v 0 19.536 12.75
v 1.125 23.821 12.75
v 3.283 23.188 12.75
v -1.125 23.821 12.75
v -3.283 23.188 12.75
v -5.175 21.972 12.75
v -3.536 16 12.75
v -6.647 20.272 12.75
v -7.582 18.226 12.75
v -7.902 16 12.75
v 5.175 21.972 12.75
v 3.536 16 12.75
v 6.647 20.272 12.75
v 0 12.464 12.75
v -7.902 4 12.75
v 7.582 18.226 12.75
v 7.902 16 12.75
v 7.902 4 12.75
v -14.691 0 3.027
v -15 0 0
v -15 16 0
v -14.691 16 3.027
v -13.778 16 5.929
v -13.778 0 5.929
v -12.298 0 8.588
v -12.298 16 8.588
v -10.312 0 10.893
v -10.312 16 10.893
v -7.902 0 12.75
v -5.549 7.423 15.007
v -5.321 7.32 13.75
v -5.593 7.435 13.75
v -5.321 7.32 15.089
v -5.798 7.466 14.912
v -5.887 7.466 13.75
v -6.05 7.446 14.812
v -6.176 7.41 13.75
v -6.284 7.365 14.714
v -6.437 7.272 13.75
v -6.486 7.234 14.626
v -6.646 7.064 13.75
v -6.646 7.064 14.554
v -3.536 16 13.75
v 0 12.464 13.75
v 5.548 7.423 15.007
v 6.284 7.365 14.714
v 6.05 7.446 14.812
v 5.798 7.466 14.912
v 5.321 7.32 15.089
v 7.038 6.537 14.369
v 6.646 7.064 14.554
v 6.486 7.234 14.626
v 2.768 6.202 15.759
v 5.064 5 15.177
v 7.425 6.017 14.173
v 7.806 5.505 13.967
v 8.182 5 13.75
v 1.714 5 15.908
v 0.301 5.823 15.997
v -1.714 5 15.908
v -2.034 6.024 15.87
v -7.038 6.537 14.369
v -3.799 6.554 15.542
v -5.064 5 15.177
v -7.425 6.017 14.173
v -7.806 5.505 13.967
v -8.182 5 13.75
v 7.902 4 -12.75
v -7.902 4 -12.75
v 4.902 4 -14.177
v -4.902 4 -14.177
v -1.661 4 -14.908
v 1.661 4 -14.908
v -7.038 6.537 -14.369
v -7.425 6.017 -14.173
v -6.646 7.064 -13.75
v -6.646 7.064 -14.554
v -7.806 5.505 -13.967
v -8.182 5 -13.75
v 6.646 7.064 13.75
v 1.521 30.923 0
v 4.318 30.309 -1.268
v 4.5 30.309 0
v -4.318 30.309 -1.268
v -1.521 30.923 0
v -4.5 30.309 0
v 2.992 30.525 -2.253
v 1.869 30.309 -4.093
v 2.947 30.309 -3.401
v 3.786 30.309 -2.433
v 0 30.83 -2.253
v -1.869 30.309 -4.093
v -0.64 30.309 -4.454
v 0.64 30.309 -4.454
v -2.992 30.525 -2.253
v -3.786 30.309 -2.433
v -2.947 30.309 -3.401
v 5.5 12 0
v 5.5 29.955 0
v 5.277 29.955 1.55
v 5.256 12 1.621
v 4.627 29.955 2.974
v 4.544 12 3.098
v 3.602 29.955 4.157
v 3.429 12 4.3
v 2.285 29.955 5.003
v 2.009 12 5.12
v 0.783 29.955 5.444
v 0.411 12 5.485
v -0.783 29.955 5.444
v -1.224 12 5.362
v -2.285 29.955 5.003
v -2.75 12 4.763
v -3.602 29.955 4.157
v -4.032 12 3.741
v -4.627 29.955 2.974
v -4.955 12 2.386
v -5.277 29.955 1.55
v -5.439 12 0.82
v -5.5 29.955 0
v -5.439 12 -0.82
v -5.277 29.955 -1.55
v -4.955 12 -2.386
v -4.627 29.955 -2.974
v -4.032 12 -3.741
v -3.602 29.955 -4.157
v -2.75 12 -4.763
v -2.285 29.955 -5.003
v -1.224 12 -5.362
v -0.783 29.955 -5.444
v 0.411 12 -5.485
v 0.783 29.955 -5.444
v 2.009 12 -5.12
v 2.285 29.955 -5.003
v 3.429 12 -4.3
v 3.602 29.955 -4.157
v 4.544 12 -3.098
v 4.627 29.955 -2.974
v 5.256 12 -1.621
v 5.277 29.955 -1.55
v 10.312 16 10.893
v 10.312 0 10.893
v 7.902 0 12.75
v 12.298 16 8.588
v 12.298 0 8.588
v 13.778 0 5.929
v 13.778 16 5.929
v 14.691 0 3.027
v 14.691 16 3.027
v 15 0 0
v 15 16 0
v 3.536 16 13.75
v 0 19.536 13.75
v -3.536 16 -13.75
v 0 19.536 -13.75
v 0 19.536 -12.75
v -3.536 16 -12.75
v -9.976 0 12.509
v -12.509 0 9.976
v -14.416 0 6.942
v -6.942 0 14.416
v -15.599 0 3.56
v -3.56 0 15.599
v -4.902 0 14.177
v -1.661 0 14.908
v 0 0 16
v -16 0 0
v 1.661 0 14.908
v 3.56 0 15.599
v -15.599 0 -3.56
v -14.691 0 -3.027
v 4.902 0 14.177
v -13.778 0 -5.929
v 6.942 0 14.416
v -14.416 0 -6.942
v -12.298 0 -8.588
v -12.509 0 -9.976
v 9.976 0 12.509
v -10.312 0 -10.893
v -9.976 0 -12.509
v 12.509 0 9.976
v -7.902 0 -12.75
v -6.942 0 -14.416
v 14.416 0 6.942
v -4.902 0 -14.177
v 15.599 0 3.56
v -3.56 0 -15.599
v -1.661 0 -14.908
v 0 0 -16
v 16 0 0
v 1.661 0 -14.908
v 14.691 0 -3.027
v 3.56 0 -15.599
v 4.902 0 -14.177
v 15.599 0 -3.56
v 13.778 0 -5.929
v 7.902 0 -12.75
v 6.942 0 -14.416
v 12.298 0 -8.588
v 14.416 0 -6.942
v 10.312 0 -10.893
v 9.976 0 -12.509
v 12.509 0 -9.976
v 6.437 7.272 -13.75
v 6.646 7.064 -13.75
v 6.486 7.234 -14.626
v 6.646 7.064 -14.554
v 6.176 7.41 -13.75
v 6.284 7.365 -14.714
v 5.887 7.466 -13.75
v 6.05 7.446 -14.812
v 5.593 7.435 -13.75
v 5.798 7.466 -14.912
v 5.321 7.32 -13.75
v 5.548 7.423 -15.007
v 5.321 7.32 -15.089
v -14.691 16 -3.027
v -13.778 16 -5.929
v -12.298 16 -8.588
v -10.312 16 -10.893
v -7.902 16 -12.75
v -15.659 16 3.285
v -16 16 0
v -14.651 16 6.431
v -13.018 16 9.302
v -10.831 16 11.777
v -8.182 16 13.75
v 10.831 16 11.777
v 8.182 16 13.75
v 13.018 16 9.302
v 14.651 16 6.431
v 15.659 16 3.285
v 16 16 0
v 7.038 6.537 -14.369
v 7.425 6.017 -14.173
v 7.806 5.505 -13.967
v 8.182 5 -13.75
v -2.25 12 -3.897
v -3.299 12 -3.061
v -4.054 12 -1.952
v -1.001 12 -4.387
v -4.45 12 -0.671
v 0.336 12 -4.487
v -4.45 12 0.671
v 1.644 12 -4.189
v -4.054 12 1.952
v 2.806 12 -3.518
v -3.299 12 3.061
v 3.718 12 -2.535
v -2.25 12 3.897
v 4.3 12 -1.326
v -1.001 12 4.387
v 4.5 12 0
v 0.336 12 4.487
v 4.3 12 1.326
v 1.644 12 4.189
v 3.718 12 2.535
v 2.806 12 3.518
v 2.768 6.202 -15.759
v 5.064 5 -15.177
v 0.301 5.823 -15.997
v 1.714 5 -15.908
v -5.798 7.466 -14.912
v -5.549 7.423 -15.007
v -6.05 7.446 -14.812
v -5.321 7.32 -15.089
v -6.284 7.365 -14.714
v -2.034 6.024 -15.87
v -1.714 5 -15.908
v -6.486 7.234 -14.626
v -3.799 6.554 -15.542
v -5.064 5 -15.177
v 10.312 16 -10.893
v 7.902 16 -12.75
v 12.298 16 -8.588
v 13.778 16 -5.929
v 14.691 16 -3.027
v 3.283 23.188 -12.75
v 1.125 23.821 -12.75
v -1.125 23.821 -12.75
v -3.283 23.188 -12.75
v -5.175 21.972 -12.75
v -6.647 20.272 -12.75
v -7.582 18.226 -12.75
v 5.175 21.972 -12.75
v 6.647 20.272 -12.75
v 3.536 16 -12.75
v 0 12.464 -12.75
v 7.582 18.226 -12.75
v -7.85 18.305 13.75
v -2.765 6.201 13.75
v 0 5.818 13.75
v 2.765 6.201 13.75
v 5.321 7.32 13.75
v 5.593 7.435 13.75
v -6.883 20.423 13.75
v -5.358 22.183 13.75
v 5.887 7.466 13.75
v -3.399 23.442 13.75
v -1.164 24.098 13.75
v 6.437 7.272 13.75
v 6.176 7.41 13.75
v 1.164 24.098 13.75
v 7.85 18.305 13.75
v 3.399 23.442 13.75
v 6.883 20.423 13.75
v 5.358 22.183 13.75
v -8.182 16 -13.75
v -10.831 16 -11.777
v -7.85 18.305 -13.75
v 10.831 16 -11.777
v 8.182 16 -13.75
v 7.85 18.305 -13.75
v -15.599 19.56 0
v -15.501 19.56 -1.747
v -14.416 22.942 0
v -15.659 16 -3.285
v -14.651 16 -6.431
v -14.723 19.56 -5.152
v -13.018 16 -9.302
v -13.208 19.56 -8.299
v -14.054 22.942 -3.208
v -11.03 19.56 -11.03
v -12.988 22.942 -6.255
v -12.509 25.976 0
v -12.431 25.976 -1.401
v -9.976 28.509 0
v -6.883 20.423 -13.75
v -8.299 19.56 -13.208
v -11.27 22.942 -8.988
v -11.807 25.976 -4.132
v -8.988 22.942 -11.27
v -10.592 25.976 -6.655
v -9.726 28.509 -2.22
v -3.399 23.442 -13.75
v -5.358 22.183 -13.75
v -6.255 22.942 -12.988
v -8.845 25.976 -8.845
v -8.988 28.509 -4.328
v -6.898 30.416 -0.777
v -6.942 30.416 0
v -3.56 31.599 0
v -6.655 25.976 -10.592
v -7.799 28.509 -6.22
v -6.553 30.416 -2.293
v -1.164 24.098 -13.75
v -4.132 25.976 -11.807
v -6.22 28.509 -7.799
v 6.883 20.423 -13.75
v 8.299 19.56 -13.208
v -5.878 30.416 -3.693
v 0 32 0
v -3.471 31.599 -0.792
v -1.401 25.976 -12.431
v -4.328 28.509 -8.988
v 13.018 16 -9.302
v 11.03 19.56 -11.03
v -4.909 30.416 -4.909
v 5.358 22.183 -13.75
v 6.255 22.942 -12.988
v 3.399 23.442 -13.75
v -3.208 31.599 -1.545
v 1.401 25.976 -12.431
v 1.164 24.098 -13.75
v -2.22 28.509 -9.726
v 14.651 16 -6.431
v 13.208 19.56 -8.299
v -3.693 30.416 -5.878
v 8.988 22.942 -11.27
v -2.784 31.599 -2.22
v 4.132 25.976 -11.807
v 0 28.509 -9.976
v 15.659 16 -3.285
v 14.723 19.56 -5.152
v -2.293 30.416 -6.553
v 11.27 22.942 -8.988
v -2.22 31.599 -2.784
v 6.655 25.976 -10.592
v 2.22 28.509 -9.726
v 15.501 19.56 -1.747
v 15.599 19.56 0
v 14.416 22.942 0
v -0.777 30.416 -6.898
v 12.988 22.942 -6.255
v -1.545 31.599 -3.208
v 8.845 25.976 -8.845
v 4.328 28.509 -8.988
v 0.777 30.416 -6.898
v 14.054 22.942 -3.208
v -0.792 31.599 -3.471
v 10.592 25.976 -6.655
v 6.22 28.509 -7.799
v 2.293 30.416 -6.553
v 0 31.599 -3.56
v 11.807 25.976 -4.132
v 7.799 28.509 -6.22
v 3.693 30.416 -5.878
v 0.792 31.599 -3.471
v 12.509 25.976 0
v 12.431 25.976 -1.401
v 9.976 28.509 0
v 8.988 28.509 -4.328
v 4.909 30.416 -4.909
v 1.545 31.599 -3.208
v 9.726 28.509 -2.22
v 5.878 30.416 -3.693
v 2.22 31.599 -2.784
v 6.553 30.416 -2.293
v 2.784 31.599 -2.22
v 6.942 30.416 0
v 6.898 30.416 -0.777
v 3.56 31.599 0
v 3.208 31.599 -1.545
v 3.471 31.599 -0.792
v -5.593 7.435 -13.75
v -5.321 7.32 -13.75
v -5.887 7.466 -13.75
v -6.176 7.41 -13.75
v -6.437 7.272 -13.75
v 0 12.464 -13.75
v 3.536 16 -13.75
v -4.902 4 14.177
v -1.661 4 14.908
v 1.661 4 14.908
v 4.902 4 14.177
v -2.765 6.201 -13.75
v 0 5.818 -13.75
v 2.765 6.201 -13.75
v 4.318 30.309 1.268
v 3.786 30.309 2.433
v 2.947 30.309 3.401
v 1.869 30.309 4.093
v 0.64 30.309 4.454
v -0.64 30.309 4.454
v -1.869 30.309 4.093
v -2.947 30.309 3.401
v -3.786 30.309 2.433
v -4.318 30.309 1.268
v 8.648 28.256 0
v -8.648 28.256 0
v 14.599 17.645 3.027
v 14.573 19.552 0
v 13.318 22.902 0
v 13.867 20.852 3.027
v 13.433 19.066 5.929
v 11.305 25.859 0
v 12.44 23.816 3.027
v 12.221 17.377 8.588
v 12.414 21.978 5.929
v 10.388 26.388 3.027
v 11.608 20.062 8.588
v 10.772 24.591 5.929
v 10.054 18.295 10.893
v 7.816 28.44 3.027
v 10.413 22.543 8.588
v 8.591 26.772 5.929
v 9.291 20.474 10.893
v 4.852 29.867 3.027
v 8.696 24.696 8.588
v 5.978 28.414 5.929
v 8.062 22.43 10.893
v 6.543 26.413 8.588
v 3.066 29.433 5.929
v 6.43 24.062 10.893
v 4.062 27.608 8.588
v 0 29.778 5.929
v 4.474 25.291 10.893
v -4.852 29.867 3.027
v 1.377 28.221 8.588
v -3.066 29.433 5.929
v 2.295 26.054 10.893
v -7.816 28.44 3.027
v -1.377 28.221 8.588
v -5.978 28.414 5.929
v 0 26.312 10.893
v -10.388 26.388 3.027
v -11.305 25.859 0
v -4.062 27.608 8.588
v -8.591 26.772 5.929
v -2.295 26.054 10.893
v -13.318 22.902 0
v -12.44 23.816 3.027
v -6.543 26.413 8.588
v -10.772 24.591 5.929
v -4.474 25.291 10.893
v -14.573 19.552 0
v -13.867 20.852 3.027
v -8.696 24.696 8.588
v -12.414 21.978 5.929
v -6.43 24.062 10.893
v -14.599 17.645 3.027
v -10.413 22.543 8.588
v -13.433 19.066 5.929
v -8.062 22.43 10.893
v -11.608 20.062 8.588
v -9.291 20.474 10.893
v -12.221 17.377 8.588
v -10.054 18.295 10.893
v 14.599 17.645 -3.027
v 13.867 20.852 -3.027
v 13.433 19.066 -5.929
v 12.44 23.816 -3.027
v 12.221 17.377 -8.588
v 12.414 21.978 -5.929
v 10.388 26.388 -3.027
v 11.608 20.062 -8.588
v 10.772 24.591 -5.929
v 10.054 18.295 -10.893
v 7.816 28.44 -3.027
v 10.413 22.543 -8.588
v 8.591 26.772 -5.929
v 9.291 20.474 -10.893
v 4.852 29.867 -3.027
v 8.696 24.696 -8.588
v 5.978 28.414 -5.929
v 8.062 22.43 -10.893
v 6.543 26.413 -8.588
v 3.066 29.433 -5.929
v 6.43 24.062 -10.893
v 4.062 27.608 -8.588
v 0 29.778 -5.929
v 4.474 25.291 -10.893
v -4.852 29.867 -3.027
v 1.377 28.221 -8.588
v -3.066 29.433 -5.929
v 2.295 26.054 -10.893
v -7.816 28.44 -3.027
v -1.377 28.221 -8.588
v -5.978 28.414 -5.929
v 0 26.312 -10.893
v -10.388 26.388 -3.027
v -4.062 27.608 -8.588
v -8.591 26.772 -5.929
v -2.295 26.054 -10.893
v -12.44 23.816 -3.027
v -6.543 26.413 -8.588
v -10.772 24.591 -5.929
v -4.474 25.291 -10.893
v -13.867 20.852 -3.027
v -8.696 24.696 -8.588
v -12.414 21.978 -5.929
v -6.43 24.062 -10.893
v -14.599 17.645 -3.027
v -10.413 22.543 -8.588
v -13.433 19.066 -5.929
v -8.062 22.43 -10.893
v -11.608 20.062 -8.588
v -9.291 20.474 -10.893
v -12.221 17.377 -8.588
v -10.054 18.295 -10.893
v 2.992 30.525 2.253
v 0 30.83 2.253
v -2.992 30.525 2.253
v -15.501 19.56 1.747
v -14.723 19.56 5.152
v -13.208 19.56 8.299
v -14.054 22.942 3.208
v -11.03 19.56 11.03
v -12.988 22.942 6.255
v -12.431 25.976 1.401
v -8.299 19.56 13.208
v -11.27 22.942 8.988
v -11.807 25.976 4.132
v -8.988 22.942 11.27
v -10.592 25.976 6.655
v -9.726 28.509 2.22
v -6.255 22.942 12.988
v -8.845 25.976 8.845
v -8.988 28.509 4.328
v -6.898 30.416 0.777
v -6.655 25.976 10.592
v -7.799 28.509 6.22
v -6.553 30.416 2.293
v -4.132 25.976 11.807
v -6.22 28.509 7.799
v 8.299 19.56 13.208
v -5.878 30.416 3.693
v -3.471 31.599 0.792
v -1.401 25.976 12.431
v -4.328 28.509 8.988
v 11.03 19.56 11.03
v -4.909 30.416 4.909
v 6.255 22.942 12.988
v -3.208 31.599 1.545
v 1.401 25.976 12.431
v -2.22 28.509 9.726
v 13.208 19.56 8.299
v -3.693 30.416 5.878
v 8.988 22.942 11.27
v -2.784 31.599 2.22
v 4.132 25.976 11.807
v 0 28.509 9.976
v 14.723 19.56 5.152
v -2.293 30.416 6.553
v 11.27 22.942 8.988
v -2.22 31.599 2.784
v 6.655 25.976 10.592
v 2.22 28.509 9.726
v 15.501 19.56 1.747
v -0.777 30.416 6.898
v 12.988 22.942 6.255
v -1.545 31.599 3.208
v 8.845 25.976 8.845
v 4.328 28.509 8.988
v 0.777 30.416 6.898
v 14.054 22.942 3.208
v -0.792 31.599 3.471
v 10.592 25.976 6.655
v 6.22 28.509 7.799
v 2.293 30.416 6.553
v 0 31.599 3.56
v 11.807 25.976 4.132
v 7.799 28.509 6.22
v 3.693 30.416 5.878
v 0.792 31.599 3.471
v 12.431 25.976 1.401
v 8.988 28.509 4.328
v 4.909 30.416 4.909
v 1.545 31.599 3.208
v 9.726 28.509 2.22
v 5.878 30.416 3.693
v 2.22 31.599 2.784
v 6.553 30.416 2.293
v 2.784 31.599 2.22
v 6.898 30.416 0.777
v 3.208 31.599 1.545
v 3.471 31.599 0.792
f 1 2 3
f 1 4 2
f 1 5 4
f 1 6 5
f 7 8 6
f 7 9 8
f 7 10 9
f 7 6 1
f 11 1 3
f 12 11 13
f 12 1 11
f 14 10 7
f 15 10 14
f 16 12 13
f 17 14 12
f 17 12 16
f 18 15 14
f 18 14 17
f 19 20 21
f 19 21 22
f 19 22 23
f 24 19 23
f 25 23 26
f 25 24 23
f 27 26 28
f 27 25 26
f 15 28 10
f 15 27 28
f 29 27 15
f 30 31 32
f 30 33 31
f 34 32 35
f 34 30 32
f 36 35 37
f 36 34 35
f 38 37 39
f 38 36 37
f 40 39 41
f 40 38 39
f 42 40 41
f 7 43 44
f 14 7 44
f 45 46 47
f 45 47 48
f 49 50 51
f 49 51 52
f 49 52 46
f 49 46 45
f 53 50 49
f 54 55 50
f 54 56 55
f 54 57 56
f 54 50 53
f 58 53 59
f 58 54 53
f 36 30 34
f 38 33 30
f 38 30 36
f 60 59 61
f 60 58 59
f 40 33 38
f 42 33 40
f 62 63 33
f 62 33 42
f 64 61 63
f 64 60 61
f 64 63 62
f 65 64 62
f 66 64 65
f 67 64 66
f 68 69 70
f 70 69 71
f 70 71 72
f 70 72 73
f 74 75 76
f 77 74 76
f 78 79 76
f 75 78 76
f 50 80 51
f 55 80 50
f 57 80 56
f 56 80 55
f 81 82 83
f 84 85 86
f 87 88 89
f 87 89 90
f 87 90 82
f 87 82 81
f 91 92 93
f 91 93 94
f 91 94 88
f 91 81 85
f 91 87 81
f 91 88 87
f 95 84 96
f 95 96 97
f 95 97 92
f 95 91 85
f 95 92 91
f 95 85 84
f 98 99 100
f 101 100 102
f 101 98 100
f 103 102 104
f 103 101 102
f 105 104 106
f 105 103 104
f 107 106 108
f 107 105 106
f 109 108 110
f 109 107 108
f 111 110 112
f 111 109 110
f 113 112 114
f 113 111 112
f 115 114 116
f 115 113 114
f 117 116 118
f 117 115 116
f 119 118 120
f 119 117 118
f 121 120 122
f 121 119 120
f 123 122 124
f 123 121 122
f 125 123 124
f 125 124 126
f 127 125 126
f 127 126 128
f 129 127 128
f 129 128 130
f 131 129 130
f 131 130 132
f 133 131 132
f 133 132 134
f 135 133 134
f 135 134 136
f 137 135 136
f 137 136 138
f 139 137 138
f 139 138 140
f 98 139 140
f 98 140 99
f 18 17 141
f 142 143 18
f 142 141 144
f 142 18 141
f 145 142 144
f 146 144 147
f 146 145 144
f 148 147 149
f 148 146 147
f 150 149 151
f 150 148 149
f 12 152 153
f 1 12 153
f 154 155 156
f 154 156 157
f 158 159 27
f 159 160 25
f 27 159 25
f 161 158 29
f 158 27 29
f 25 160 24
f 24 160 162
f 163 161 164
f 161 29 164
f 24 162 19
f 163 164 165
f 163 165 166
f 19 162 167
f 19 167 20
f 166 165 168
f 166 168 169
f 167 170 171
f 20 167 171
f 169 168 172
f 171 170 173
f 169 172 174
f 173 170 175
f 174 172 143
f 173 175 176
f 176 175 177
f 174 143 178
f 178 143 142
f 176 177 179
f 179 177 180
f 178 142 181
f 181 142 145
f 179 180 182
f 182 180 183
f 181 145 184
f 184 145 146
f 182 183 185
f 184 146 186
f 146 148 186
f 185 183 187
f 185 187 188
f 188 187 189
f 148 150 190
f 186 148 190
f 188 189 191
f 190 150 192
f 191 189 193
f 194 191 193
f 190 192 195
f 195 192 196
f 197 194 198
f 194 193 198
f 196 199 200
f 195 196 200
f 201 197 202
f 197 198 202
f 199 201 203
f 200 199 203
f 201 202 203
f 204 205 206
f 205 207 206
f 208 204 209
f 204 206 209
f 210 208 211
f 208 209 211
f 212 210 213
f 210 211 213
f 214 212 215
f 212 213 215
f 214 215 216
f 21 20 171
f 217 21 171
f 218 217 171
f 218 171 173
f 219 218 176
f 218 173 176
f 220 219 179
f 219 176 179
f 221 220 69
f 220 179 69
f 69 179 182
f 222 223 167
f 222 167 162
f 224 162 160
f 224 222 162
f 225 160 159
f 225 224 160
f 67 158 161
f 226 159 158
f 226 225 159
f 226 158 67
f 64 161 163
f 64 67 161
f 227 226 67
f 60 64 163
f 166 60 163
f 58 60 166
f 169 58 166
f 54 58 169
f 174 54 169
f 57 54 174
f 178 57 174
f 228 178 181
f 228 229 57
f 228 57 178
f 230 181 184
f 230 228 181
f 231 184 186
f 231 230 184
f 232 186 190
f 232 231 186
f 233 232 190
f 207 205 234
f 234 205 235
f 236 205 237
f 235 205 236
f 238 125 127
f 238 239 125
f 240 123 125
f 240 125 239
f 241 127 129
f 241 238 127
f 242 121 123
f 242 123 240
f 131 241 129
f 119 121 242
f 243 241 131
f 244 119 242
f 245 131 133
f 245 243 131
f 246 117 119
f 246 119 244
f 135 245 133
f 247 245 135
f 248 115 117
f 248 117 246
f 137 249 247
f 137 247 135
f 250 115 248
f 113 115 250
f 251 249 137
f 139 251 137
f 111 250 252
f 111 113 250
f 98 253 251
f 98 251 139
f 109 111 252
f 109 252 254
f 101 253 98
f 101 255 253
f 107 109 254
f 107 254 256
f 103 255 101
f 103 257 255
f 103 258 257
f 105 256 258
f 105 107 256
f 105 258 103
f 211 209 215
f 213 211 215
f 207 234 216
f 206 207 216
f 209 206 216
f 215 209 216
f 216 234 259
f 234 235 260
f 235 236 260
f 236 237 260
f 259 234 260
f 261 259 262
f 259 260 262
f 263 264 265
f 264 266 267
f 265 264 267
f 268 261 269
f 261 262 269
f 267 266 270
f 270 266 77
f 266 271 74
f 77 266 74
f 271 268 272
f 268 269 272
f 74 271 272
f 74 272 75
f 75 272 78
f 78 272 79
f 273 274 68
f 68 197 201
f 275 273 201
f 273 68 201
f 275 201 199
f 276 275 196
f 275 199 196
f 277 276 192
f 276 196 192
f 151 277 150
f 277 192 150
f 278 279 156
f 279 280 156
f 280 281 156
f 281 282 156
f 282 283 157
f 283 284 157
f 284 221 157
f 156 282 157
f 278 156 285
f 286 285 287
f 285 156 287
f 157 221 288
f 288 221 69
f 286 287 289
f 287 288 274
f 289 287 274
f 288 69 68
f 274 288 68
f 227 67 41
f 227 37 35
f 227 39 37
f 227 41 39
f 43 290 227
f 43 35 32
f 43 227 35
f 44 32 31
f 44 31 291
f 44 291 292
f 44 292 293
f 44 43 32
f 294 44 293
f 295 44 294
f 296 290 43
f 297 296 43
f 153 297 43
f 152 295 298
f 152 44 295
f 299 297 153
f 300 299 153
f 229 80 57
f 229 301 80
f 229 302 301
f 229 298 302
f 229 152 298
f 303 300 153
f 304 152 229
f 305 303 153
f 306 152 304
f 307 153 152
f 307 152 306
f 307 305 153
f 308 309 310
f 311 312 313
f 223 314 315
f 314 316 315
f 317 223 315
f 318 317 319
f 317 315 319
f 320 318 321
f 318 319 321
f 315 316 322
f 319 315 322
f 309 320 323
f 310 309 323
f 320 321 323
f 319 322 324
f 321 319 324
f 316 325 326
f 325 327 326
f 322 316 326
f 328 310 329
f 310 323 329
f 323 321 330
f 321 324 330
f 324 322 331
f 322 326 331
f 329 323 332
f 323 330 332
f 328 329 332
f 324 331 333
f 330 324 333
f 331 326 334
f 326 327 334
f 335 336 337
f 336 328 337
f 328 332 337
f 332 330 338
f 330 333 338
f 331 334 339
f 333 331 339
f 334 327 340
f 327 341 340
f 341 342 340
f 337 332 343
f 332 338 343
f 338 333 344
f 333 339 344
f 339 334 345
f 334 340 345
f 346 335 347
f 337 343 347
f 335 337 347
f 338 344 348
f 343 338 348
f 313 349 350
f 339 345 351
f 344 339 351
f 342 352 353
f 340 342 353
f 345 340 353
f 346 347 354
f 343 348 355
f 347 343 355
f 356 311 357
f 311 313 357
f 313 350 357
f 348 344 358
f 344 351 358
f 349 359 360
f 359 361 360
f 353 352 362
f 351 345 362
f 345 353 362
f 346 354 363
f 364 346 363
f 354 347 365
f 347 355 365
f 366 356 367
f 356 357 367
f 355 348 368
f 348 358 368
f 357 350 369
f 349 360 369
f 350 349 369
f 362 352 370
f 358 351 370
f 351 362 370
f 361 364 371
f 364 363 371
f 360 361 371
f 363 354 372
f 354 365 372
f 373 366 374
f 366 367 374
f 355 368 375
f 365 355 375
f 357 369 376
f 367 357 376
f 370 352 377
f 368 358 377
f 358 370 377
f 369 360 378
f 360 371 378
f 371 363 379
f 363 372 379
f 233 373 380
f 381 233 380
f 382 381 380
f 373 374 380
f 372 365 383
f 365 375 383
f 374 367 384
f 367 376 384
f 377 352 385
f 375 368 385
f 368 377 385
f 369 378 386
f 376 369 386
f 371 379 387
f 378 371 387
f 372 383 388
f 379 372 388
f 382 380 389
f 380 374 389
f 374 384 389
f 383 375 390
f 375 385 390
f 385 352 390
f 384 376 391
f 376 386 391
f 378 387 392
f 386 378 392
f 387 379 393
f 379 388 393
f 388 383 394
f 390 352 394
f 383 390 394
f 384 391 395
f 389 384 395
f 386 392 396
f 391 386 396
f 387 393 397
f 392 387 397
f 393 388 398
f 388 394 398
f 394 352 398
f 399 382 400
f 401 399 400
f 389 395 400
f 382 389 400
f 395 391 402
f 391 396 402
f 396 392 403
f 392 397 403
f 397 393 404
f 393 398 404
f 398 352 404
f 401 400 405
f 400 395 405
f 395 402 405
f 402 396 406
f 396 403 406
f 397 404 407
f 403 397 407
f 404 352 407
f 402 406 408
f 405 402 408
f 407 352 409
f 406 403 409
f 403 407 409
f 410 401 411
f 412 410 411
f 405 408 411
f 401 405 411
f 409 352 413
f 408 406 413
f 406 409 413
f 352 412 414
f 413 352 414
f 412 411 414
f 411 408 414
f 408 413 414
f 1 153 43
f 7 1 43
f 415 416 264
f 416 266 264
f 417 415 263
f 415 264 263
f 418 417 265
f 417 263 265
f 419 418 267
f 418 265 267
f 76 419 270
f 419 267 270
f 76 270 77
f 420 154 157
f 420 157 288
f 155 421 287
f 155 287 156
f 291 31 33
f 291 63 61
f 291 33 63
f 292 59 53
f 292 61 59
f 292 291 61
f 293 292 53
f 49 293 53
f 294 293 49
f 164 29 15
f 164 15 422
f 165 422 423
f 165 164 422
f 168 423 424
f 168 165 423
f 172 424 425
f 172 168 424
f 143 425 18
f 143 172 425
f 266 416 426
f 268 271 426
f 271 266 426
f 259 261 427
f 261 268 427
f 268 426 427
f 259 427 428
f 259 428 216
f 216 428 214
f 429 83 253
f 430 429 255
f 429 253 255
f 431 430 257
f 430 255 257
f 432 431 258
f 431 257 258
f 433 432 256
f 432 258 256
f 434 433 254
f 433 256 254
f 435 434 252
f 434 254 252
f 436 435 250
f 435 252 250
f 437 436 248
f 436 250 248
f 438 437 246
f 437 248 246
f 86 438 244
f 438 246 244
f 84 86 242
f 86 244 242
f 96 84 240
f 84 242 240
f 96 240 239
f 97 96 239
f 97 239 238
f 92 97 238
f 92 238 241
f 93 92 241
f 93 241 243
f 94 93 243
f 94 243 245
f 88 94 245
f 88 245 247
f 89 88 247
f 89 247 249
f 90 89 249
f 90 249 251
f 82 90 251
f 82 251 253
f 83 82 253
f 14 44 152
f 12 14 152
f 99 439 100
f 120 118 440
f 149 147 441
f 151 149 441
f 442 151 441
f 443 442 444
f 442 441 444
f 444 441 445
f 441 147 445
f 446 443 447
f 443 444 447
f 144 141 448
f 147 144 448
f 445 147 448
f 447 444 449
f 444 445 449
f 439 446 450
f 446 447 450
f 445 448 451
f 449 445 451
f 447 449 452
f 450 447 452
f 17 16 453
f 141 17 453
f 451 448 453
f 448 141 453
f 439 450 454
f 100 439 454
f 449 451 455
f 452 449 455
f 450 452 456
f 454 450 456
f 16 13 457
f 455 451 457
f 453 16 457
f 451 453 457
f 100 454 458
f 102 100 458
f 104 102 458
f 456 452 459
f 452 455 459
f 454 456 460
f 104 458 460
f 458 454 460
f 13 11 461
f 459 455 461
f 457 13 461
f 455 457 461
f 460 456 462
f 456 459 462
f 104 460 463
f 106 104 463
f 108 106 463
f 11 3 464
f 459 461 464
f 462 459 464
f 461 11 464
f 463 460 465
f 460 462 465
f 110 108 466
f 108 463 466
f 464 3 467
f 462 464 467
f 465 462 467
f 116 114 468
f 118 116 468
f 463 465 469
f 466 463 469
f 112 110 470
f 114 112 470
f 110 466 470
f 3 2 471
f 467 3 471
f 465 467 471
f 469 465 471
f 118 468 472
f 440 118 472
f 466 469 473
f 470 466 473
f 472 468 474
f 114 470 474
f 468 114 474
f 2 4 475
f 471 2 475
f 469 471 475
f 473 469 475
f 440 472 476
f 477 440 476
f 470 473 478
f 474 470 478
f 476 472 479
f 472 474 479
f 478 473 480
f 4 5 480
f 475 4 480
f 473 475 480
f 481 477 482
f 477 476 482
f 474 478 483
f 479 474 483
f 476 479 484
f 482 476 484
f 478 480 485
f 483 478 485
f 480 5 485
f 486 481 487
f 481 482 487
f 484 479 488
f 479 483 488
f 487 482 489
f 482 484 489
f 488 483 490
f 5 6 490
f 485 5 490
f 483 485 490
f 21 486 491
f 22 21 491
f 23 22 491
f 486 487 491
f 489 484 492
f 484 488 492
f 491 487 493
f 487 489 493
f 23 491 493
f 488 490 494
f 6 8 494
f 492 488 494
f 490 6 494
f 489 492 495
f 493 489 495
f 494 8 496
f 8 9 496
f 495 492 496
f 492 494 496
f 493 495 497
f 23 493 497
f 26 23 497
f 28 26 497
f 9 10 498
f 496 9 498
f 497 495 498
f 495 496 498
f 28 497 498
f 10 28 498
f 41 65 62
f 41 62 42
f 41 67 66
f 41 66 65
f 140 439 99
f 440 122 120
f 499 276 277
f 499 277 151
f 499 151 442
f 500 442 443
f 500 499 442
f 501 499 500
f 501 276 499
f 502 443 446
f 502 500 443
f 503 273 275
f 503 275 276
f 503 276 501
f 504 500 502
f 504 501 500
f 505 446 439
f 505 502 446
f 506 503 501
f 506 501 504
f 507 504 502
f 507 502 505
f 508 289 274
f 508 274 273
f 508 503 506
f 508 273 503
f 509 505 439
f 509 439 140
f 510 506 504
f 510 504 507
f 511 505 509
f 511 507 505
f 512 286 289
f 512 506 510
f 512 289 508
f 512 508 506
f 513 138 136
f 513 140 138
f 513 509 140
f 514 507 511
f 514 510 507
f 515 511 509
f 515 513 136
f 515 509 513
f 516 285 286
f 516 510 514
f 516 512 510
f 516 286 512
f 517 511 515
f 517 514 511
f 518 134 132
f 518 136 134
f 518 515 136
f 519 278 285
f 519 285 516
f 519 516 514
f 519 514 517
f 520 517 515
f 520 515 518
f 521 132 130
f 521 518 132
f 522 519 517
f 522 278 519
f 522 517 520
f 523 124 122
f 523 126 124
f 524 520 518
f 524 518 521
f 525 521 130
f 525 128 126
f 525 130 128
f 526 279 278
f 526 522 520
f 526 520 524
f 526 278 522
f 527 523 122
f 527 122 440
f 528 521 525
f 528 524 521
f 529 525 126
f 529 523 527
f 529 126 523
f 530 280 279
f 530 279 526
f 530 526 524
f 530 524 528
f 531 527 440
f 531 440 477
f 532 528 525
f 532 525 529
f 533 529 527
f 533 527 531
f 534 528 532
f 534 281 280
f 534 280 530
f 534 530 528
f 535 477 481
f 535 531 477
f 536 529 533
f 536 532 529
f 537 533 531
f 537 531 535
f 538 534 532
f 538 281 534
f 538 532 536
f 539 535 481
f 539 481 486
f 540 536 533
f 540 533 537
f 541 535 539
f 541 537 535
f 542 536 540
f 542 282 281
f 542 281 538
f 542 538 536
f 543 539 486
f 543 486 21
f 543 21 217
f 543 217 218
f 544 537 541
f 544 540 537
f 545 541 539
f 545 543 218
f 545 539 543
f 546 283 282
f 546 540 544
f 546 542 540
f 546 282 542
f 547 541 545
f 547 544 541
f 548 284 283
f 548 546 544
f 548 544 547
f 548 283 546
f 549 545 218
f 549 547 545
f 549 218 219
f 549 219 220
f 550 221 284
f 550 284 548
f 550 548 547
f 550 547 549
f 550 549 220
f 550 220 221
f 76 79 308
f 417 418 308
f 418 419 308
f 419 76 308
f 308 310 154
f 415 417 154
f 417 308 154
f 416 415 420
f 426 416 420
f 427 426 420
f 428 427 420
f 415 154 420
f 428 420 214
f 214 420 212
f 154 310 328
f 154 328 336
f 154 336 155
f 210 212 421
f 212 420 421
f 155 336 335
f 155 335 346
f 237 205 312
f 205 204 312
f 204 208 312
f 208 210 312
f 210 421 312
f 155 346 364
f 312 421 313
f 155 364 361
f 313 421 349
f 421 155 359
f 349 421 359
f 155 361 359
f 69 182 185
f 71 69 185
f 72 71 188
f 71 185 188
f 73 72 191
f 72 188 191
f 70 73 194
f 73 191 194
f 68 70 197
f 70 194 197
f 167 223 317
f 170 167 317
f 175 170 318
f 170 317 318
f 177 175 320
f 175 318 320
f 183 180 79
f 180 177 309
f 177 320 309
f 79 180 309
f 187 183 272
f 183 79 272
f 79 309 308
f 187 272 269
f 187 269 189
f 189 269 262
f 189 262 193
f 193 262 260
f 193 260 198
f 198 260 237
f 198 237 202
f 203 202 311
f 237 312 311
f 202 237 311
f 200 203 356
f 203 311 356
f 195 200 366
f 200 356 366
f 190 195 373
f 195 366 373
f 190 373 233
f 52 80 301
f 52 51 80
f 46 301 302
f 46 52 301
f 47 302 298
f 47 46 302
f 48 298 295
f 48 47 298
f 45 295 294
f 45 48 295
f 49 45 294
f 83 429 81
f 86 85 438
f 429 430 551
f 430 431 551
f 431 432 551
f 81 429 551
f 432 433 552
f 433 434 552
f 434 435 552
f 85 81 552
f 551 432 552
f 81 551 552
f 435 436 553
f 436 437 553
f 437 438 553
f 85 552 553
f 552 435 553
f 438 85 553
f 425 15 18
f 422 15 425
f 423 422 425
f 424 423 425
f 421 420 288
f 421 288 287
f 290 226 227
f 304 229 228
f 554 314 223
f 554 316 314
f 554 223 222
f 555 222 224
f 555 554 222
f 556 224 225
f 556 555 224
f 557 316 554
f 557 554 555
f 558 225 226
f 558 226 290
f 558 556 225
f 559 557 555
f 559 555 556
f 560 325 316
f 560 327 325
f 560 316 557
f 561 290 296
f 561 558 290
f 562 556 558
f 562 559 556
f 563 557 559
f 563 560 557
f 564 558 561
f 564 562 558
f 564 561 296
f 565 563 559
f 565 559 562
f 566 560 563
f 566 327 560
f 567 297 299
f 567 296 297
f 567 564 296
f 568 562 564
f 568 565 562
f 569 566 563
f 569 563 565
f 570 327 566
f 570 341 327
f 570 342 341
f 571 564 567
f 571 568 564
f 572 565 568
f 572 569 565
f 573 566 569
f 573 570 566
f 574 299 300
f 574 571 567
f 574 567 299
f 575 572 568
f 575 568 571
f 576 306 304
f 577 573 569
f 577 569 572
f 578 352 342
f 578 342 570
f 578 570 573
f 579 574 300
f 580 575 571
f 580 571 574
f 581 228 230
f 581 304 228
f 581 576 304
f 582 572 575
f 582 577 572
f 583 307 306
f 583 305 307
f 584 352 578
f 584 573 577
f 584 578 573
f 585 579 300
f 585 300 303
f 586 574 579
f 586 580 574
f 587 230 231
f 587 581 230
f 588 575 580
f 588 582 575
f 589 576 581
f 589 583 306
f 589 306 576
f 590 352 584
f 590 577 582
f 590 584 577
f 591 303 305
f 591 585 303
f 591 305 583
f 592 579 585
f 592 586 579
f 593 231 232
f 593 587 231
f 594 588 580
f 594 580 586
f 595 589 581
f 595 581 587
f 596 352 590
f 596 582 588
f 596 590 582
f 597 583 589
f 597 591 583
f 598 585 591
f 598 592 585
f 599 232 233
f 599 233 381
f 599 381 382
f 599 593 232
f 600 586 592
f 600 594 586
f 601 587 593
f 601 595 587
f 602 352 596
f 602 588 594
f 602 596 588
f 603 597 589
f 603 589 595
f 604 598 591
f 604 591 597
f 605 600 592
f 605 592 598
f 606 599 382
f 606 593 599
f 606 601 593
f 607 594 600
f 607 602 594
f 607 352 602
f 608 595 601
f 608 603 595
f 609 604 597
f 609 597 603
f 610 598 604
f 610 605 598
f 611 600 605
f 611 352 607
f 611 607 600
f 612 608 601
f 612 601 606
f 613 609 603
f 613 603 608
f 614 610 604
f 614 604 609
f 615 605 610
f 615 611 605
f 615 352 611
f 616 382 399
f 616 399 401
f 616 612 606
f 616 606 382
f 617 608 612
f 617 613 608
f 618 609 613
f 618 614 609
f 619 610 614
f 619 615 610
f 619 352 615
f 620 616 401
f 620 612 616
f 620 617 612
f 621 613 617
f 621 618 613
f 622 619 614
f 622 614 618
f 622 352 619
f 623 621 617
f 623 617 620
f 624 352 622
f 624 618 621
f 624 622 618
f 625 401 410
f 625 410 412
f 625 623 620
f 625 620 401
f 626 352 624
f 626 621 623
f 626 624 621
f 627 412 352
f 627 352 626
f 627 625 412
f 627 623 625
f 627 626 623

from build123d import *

# Parameters (mm, degrees)
REVOLVE1_ANGLE           = 180
CUT_EXTRUDE1_DEPTH       = 39.328351126
SHELL1_DEPTH             = 16
SHELL1_2_DEPTH           = 4
EXTRUDE1_REACH           = 40.328
EXTRUDE1_END_RADIUS      = 16
CUT_EXTRUDE2_REACH       = 40.328
EXTRUDE_THIN1_REACH      = 53.192
EXTRUDE_THIN1_END_RADIUS = 15
EXTRUDE_THIN1_START      = -12
SKETCH5_R                = 5.5
SKETCH5_R_2              = 4.5
FILLET_1_R               = 1


with BuildPart() as part:
    # Sketch1 → Revolve1 (revolve)
    with BuildSketch(Plane(origin=(0, 0, 0), x_dir=(-1, 0, 0), z_dir=(0, 0, -1))):
        with BuildLine():
            Line((0, 0), (16, 0))
            Line((16, 0), (16, 16))
            ThreePointArc((16, 16), (11.313708499, 27.313708499), (0, 32))
            Line((0, 32), (0, 0))
        make_face()
    revolve(axis=Axis((0, 0, 0), (0, 1, 0)), revolution_arc=REVOLVE1_ANGLE)

    # Sketch2 → Cut-Extrude1 (cut, through all)
    with BuildSketch(Plane.XY.offset(13.75)):
        with BuildLine():
            Line((8.181534086, 5), (8.181534086, 16))
            ThreePointArc((8.181534086, 16), (0, 24.181534086), (-8.181534086, 16))
            Line((-8.181534086, 16), (-8.181534086, 5))
            Line((-8.181534086, 5), (8.181534086, 5))
        make_face()
    extrude(amount=CUT_EXTRUDE1_DEPTH, mode=Mode.SUBTRACT)

    # Shell1: read off the stored shape, not the designer's step
    # Shell1 outline → Shell1 (cut)
    with BuildSketch(Plane(origin=(0, 0, 0), x_dir=(1, 0, 0), z_dir=(0, 1, 0))):
        with BuildLine():
            ThreePointArc((7.901740315, -12.75), (13.105840391, -7.296365372), (15, 0))
            Line((15, 0), (-15, 0))
            ThreePointArc((-15, 0), (-13.105840391, -7.296365372), (-7.901740315, -12.75))
            Line((-7.901740315, -12.75), (7.901740315, -12.75))
        make_face()
    extrude(amount=SHELL1_DEPTH, mode=Mode.SUBTRACT)

    # Shell1 2 outline → Shell1 2 (cut)
    with BuildSketch(Plane(origin=(0, 0, 0), x_dir=(1, 0, 0), z_dir=(0, 1, 0))):
        with BuildLine():
            ThreePointArc((-7.901740315, -12.75), (0, -15), (7.901740315, -12.75))
            Line((7.901740315, -12.75), (-7.901740315, -12.75))
        make_face()
    extrude(amount=SHELL1_2_DEPTH, mode=Mode.SUBTRACT)

    # Shell1 3 outline → Shell1 3 (revolve, cut)
    with BuildSketch(Plane.XZ.offset(-16)):
        with BuildLine():
            ThreePointArc((15, 0), (13.105840391, 7.296365372), (7.901740315, 12.75))
            Line((7.901740315, 12.75), (0, 12.75))
            Line((0, 12.75), (0, 0))
            Line((0, 0), (15, 0))
        make_face()
    revolve(axis=Axis((0, 16, 0), (0, 0, 1)), mode=Mode.SUBTRACT)

    # Extrude1: up to this cylinder (the profile starts inside it)
    extrude1_end = Plane(origin=(0, 6.31611, 0), z_dir=(0, -1, 0)) * Cylinder(EXTRUDE1_END_RADIUS, 113.656, mode=Mode.PRIVATE)
    # Sketch3 → Extrude1 (add, up to the surface)
    with BuildSketch(Plane.XY.offset(13.75), mode=Mode.PRIVATE) as extrude1_sk1:
        with BuildLine():
            Line((6.076328446, 7.830430308), (8.181534086, 5))
            Line((8.181534086, 5), (-8.181534086, 5))
            Line((-8.181534086, 5), (-6.076328446, 7.830430308))
            ThreePointArc((-6.076328446, 7.830430308), (0, 5.818465914), (6.076328446, 7.830430308))
        make_face()
    extrude1_tool1 = extrude(extrude1_sk1.sketch, amount=EXTRUDE1_REACH, mode=Mode.PRIVATE) & extrude1_end
    add(extrude1_tool1.solids().sort_by_distance((6.995686, 6.31611, 13.75))[0])

    # Sketch4 → Cut-Extrude2 (cut, up to next)
    with BuildSketch(Plane.XY.offset(13.75), mode=Mode.PRIVATE) as cut_extrude2_sk1:
        Polygon((-3.535533906, 16), (0, 12.464466094), (3.535533906, 16), (0, 19.535533906), align=None)
    cut_extrude2_tool1 = extrude(cut_extrude2_sk1.sketch, amount=-CUT_EXTRUDE2_REACH, mode=Mode.PRIVATE) & part.part
    add(cut_extrude2_tool1.solids().sort_by_distance((0, 16, 13.75))[0], mode=Mode.SUBTRACT)

    # Mirror1: part across face


with BuildPart() as part_1:
    add(part.part)
    add(part.part.mirror(Plane(origin=(0, 18.784156894, 0), x_dir=(1, 0, 0), z_dir=(0, 0, -1))))

    # Extrude-Thin1: up to this sphere (the profile starts inside it)
    extrude_thin1_end = Location((0, 16, 0)) * Sphere(EXTRUDE_THIN1_END_RADIUS, mode=Mode.PRIVATE)
    # Sketch5 → Extrude-Thin1 (add, up to the surface)
    with BuildSketch(Plane.XZ.offset(EXTRUDE_THIN1_START), mode=Mode.PRIVATE) as extrude_thin1_sk1:
        Circle(SKETCH5_R)
        Circle(SKETCH5_R_2, mode=Mode.SUBTRACT)
    extrude_thin1_tool1 = extrude(extrude_thin1_sk1.sketch, amount=-EXTRUDE_THIN1_REACH, mode=Mode.PRIVATE) & extrude_thin1_end
    add(extrude_thin1_tool1.solids().sort_by_distance((-5.344437, 12, 0))[0])

    # 圓角1
    fillet_1_edges = [part_1.edges().sort_by_distance(p)[0] for p in [
        (6.076328446, 7.830430308, 14.275645793),
        (-6.076328446, 7.830430308, 14.275645793),
        (-6.076328446, 7.830430308, -14.275645793),
        (6.076328446, 7.830430308, -14.275645793),
    ]]
    fillet(fillet_1_edges, radius=FILLET_1_R)


solid = part_1.part
